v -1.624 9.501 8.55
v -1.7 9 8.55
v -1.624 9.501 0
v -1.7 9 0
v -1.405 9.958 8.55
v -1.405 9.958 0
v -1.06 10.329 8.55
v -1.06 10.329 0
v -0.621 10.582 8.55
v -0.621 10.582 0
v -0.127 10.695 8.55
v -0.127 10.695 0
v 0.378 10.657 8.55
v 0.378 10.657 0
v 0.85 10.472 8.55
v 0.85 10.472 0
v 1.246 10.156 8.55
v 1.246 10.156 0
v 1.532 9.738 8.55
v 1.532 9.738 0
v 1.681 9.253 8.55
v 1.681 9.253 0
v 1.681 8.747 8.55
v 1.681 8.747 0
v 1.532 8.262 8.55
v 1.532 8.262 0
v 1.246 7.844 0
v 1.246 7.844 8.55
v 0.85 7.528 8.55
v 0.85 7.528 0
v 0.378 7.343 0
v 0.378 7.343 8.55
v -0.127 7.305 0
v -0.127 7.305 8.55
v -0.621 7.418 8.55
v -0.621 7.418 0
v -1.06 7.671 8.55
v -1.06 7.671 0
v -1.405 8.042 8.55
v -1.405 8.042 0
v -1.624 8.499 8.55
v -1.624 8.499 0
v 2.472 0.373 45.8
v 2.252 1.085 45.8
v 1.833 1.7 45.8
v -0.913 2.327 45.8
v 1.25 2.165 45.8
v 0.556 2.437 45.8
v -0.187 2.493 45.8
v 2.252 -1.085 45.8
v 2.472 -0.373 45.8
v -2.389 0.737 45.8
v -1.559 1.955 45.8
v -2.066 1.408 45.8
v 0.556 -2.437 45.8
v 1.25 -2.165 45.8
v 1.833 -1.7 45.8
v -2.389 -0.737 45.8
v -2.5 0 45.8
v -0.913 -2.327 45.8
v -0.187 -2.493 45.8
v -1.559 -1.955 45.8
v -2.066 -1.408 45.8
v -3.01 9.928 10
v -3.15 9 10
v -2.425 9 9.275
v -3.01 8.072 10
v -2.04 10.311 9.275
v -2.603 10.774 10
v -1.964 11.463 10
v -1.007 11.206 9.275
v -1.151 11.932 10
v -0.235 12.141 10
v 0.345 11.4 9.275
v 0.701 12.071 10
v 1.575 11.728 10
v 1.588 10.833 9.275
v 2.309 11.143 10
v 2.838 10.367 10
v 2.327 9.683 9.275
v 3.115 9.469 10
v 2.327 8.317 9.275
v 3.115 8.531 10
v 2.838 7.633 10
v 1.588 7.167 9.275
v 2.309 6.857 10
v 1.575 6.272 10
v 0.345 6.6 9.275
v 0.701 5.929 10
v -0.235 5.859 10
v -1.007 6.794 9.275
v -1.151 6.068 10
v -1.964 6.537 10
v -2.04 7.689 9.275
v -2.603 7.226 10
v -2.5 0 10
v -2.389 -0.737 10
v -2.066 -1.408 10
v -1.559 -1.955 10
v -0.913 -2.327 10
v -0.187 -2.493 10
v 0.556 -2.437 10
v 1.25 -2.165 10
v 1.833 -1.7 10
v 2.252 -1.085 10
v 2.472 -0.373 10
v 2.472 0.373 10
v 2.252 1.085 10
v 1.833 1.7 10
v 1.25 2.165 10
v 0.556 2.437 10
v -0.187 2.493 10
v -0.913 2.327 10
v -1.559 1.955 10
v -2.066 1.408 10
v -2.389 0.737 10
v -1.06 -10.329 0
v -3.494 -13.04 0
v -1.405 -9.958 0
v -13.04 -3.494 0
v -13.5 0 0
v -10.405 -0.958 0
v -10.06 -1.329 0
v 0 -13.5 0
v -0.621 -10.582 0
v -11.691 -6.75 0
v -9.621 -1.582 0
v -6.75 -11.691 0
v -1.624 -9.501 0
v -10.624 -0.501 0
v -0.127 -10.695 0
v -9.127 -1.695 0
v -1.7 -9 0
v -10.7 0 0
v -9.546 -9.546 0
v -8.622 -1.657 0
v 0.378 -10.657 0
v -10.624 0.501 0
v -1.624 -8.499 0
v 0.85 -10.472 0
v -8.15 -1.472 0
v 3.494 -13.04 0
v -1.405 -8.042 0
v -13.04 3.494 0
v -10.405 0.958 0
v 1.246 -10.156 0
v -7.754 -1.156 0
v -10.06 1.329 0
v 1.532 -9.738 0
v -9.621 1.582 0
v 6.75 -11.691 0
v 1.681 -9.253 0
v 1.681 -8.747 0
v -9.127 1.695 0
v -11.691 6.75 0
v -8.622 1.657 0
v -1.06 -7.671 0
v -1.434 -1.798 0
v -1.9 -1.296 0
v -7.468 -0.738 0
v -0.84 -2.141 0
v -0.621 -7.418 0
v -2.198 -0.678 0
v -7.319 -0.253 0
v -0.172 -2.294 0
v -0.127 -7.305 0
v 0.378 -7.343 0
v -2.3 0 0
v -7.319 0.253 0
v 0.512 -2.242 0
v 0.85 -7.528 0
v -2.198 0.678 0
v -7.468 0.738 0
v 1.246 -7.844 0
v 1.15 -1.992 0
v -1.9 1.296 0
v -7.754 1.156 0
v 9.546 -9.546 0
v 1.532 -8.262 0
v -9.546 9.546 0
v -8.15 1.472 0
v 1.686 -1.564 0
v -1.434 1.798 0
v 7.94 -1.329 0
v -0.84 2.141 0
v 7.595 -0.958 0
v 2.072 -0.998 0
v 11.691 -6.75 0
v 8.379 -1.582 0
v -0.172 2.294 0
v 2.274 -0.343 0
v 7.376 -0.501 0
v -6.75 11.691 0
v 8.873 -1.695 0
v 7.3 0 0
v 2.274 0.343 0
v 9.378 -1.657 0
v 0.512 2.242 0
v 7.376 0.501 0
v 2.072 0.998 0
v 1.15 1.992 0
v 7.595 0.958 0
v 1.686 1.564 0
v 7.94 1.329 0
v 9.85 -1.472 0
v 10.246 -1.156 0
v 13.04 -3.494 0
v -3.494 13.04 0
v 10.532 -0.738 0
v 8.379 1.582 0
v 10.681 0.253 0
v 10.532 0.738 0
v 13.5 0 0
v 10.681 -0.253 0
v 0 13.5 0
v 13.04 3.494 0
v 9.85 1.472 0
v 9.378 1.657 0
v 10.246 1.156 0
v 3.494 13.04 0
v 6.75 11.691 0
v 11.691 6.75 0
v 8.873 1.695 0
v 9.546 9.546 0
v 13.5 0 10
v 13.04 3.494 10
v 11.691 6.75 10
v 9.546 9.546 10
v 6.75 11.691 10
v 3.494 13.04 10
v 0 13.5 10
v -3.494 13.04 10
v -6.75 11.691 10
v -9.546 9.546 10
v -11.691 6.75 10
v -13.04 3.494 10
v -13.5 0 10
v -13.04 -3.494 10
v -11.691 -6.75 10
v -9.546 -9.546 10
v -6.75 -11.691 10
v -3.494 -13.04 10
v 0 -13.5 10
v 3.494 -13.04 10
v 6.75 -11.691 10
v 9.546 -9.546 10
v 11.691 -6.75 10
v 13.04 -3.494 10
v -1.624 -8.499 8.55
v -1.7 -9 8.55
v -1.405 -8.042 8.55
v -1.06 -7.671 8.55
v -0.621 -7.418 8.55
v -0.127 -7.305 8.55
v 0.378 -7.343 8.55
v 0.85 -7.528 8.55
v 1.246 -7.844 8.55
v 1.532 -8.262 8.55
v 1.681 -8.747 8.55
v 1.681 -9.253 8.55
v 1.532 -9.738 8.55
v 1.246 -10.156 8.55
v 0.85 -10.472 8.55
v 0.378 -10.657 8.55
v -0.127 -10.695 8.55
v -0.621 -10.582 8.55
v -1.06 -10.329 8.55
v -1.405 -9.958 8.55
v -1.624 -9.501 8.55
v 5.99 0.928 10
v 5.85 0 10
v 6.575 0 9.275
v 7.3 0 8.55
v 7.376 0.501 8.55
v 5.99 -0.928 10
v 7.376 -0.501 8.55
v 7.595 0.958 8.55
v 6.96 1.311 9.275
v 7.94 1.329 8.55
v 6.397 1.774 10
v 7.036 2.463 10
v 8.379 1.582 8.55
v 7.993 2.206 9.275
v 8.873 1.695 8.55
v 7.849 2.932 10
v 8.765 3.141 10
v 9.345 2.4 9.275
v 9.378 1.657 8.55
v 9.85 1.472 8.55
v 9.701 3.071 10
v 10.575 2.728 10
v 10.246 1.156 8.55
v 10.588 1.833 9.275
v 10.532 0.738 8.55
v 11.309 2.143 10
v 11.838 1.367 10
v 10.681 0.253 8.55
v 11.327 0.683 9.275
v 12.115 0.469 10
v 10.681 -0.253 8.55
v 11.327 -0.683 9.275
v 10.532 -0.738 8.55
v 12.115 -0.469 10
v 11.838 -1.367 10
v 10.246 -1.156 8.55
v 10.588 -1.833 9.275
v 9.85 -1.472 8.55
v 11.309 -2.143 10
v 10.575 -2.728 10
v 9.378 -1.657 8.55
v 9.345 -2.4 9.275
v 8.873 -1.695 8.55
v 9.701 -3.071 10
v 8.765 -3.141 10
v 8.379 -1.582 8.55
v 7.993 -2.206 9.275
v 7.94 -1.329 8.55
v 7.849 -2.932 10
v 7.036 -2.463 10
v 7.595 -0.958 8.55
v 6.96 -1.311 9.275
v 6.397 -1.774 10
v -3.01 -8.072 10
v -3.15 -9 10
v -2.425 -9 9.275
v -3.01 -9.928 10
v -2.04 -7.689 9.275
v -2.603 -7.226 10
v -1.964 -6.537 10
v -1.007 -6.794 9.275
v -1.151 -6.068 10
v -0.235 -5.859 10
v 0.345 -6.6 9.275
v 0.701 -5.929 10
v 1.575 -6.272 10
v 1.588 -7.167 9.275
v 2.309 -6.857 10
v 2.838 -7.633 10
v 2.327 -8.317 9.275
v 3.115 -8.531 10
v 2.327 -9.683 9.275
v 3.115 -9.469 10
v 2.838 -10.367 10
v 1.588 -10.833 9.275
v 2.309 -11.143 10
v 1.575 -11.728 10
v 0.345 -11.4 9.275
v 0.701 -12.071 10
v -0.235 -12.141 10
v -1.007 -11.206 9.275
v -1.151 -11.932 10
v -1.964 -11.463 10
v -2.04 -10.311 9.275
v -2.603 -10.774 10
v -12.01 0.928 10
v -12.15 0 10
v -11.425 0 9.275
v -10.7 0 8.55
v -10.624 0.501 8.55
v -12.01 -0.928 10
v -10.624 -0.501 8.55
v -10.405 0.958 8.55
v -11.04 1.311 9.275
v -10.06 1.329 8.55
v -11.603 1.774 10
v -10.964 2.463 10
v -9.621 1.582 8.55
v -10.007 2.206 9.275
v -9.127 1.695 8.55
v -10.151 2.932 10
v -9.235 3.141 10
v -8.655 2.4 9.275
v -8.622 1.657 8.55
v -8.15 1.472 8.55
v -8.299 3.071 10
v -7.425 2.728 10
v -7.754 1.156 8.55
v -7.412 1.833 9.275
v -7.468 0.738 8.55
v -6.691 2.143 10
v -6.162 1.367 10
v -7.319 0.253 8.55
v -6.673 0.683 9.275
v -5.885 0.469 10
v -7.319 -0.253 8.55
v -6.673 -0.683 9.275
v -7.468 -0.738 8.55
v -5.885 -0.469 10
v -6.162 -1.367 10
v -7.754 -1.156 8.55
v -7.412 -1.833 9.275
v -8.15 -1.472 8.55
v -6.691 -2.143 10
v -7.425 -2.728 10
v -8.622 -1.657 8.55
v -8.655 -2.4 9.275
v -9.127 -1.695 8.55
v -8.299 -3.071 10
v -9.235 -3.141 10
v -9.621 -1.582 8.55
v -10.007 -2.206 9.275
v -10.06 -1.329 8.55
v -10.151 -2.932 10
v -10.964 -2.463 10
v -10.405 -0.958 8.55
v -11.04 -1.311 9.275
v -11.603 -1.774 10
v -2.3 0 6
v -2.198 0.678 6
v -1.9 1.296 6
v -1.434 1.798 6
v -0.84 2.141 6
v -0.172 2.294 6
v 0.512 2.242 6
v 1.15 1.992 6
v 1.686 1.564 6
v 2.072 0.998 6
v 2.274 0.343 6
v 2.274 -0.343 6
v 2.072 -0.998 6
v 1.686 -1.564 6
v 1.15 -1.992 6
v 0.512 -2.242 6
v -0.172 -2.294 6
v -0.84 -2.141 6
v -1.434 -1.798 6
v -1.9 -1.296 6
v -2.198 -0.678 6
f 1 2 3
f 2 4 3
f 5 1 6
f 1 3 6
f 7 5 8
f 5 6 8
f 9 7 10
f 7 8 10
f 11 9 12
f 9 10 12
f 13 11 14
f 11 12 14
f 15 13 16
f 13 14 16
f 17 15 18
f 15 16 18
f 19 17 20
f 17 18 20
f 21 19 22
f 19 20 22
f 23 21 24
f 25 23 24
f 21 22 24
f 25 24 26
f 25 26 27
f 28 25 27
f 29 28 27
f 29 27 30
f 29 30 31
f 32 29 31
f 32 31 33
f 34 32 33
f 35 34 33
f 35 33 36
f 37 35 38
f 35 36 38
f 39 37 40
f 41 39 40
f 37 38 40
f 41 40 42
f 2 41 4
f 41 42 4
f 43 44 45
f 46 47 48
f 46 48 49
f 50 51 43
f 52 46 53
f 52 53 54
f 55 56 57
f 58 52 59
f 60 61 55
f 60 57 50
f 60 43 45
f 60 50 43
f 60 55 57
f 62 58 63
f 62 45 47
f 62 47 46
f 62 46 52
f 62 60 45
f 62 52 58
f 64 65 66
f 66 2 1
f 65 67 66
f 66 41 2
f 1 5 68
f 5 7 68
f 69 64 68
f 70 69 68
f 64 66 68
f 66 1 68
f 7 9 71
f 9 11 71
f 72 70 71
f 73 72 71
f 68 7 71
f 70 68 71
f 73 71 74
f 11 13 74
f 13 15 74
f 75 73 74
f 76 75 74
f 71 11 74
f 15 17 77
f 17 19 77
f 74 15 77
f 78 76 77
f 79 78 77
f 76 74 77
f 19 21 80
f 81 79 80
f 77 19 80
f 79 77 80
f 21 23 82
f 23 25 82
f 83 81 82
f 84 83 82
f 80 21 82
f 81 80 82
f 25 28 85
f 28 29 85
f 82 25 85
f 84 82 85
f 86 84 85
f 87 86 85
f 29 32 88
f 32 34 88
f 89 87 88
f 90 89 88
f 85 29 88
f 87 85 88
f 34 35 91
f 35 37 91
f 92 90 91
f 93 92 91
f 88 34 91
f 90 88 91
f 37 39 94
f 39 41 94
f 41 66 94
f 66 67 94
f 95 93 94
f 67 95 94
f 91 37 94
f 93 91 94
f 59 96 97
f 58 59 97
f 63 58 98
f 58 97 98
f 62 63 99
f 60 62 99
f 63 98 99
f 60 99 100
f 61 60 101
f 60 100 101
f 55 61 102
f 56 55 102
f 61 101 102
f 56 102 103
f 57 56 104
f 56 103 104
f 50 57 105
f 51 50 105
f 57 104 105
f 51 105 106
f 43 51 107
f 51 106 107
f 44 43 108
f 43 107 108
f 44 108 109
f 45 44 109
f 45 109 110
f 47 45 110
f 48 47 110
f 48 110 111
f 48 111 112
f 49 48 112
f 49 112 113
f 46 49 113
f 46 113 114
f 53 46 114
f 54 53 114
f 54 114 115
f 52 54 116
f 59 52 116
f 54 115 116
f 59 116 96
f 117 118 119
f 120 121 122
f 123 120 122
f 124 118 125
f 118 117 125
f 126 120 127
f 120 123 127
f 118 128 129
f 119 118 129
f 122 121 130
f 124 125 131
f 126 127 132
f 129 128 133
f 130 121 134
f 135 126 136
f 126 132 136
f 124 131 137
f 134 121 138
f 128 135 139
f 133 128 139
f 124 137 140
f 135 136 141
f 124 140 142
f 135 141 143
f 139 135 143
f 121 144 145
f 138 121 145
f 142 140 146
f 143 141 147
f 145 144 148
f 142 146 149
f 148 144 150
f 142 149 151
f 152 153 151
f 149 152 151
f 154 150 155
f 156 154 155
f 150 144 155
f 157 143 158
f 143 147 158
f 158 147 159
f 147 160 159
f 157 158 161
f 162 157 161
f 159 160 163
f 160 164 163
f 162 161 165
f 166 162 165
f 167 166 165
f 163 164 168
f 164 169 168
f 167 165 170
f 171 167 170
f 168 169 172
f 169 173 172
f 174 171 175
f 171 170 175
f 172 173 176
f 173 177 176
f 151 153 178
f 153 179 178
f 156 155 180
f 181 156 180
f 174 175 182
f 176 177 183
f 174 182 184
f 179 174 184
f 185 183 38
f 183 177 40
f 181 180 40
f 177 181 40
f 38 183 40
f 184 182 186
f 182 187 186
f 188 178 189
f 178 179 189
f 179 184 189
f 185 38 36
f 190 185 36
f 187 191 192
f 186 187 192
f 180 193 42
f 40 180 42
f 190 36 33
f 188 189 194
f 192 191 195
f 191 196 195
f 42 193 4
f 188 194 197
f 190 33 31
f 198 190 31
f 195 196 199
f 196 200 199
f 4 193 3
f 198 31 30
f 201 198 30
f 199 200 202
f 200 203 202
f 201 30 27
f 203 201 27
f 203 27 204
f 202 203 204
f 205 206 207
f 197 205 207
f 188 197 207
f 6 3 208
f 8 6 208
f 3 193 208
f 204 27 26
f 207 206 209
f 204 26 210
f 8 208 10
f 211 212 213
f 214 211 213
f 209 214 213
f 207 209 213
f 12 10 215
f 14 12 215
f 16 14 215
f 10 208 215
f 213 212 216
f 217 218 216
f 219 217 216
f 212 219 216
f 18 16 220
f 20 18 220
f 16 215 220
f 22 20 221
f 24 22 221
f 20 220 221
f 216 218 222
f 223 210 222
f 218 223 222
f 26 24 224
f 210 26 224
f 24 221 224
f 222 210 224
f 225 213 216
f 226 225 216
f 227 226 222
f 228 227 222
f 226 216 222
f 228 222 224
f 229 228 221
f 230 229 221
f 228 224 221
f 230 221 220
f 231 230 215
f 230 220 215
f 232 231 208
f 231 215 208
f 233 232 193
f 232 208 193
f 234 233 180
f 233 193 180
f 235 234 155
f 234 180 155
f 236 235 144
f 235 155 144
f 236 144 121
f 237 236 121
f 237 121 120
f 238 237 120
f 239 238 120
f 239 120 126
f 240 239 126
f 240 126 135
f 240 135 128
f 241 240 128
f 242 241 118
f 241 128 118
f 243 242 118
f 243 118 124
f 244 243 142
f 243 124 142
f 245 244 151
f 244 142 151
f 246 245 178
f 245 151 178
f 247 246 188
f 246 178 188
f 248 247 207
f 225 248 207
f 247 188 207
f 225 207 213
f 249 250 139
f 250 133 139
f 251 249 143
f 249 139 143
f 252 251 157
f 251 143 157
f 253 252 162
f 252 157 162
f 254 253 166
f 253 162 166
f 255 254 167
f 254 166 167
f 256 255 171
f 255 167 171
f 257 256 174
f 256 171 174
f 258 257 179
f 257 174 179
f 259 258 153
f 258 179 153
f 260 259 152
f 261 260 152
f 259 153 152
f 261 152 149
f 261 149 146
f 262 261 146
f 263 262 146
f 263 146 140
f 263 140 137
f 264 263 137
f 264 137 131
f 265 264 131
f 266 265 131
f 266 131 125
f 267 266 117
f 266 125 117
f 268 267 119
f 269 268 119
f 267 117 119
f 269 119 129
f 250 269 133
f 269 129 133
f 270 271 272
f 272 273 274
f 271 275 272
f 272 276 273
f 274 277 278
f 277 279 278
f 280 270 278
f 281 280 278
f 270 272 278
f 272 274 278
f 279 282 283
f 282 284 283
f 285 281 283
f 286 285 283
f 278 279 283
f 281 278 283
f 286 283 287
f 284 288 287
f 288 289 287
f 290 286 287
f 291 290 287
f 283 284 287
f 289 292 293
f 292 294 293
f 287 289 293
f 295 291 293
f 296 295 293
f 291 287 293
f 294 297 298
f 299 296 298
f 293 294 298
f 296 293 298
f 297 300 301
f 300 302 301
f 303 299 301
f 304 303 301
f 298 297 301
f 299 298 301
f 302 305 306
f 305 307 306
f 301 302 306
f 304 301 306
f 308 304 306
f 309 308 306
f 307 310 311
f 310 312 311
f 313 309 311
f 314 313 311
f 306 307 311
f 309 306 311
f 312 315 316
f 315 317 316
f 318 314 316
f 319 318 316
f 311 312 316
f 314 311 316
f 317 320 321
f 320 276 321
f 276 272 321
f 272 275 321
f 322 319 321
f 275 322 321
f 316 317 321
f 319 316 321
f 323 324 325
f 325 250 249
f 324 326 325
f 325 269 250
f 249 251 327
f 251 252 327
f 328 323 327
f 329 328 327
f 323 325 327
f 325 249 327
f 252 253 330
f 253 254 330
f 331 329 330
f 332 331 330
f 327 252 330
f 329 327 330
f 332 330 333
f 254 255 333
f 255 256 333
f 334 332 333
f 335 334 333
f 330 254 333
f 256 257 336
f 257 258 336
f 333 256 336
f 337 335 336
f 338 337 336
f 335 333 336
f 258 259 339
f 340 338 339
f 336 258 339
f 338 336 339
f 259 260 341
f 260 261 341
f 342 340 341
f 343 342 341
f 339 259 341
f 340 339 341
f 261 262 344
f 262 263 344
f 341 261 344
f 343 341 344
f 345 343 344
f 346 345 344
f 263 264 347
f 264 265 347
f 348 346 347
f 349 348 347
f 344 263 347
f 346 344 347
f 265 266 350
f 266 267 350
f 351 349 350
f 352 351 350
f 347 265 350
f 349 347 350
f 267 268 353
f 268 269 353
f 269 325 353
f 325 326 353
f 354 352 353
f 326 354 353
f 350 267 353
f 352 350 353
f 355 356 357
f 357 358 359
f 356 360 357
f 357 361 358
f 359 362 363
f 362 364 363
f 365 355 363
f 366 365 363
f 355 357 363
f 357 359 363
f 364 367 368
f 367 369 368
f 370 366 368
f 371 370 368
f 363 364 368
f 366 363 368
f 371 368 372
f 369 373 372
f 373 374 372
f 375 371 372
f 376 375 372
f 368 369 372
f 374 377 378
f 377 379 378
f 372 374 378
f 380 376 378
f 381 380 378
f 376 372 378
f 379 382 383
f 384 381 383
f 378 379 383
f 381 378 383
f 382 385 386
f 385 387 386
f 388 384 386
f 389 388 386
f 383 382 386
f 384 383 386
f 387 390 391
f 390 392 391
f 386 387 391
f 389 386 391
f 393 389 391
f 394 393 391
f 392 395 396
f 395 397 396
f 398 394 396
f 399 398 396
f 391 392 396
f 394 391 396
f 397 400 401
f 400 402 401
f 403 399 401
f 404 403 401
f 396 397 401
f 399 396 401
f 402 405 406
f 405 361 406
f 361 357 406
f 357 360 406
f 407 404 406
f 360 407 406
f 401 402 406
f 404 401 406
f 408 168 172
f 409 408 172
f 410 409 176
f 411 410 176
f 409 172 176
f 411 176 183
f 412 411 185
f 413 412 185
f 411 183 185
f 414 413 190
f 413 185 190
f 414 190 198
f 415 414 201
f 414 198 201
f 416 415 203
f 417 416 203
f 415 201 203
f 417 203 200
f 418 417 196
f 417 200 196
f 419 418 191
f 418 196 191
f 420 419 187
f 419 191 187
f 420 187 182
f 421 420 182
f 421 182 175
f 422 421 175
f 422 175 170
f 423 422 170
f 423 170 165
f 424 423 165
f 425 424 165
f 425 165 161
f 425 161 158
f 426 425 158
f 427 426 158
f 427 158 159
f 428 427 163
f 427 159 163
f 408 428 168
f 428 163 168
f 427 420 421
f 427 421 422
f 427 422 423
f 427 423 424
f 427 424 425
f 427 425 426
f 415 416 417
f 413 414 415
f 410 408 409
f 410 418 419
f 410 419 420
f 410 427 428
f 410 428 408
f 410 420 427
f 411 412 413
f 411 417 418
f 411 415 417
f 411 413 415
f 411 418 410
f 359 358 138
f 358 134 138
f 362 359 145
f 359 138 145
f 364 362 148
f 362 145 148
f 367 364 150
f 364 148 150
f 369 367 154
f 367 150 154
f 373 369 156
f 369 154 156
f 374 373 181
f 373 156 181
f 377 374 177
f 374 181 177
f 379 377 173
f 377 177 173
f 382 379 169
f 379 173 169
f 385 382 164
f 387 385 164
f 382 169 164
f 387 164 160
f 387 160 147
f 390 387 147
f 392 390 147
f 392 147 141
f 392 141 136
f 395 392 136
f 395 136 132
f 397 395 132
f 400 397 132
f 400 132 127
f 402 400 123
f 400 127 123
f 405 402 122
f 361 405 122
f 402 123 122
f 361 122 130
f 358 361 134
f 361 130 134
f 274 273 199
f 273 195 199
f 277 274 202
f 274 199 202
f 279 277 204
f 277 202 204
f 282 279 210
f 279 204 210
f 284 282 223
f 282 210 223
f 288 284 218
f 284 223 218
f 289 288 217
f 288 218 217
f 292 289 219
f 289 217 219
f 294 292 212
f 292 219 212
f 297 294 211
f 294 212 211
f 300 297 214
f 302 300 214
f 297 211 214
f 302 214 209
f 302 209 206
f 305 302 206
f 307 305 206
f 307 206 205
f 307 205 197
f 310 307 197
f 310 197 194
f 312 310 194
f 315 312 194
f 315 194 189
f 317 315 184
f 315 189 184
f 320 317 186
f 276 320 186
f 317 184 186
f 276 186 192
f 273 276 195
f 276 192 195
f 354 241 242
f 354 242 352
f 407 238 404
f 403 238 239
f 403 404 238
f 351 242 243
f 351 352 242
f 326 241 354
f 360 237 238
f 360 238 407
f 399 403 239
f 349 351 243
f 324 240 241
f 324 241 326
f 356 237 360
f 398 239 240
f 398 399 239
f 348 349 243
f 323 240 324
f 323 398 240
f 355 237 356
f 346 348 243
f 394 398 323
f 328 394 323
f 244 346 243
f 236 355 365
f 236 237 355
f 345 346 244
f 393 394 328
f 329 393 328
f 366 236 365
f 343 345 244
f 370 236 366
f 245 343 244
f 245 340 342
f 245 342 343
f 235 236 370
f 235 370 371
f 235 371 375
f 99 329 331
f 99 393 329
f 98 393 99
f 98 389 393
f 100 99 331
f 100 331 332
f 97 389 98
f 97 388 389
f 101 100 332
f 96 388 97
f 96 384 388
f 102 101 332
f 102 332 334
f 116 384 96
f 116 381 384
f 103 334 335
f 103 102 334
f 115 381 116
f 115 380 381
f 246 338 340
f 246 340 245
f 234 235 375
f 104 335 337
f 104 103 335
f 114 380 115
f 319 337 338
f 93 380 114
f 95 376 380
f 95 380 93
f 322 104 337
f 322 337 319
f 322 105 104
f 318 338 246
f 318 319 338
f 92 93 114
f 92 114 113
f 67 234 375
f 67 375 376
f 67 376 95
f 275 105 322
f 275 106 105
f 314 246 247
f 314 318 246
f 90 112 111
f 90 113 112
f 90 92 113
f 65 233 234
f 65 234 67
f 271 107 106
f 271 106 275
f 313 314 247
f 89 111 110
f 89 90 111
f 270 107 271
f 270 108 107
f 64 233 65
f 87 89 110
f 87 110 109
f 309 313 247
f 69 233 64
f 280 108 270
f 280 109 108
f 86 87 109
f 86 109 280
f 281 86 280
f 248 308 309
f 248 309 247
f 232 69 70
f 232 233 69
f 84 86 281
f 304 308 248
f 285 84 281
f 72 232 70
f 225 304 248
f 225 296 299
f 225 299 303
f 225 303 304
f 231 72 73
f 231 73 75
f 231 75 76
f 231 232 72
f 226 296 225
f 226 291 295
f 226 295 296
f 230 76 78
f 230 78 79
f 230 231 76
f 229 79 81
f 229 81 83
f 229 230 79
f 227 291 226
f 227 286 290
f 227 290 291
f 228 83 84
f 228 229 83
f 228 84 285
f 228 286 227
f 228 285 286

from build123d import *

# Parameters (mm, degrees)
SKETCH1_R                                       = 13.5
SKETCH1_R_2                                     = 1.6
BOSS_EXTRUDE1_DEPTH                             = 10
SKETCH2_R                                       = 2.5
BOSS_EXTRUDE2_DEPTH                             = 35.8
SKETCH3_R                                       = 2.3
CUT_EXTRUDE1_DEPTH                              = 6
CSK_FOR_M3_FLAT_HEAD_MACHINE_SCREW1_D           = 3.4
CSK_FOR_M3_FLAT_HEAD_MACHINE_SCREW1_CSINK_D     = 6.3
CSK_FOR_M3_FLAT_HEAD_MACHINE_SCREW1_CSINK_ANGLE = 90


with BuildPart() as part:
    # Sketch1 → Boss-Extrude1 (new body)
    with BuildSketch(Plane.XY):
        Circle(SKETCH1_R)
        with Locations((0, 9)):
            Circle(SKETCH1_R_2, mode=Mode.SUBTRACT)
        with Locations((0, -9)):
            Circle(SKETCH1_R_2, mode=Mode.SUBTRACT)
        with Locations((-9, 0)):
            Circle(SKETCH1_R_2, mode=Mode.SUBTRACT)
        with Locations((9, 0)):
            Circle(SKETCH1_R_2, mode=Mode.SUBTRACT)
    extrude(amount=BOSS_EXTRUDE1_DEPTH)

    # Sketch2 → Boss-Extrude2 (add)
    with BuildSketch(Plane.XY.offset(10)):
        with Locations(Location((0, 0, 0), (0, 0, 180))):
            Circle(SKETCH2_R)
    extrude(amount=BOSS_EXTRUDE2_DEPTH)

    # Sketch3 → Cut-Extrude1 (cut)
    with BuildSketch(Plane(origin=(0, 0, 0), x_dir=(-1, 0, 0), z_dir=(0, 0, -1))):
        Circle(SKETCH3_R)
    extrude(amount=-CUT_EXTRUDE1_DEPTH, mode=Mode.SUBTRACT)

    # CSK for M3 Flat Head Machine Screw1 (through all)
    with Locations(Plane.XY.offset(10)):
        with Locations((0, 9), (9, 0), (-9, 0), (0, -9)):
            CounterSinkHole(CSK_FOR_M3_FLAT_HEAD_MACHINE_SCREW1_D / 2, CSK_FOR_M3_FLAT_HEAD_MACHINE_SCREW1_CSINK_D / 2, counter_sink_angle=CSK_FOR_M3_FLAT_HEAD_MACHINE_SCREW1_CSINK_ANGLE)


solid = part.part
